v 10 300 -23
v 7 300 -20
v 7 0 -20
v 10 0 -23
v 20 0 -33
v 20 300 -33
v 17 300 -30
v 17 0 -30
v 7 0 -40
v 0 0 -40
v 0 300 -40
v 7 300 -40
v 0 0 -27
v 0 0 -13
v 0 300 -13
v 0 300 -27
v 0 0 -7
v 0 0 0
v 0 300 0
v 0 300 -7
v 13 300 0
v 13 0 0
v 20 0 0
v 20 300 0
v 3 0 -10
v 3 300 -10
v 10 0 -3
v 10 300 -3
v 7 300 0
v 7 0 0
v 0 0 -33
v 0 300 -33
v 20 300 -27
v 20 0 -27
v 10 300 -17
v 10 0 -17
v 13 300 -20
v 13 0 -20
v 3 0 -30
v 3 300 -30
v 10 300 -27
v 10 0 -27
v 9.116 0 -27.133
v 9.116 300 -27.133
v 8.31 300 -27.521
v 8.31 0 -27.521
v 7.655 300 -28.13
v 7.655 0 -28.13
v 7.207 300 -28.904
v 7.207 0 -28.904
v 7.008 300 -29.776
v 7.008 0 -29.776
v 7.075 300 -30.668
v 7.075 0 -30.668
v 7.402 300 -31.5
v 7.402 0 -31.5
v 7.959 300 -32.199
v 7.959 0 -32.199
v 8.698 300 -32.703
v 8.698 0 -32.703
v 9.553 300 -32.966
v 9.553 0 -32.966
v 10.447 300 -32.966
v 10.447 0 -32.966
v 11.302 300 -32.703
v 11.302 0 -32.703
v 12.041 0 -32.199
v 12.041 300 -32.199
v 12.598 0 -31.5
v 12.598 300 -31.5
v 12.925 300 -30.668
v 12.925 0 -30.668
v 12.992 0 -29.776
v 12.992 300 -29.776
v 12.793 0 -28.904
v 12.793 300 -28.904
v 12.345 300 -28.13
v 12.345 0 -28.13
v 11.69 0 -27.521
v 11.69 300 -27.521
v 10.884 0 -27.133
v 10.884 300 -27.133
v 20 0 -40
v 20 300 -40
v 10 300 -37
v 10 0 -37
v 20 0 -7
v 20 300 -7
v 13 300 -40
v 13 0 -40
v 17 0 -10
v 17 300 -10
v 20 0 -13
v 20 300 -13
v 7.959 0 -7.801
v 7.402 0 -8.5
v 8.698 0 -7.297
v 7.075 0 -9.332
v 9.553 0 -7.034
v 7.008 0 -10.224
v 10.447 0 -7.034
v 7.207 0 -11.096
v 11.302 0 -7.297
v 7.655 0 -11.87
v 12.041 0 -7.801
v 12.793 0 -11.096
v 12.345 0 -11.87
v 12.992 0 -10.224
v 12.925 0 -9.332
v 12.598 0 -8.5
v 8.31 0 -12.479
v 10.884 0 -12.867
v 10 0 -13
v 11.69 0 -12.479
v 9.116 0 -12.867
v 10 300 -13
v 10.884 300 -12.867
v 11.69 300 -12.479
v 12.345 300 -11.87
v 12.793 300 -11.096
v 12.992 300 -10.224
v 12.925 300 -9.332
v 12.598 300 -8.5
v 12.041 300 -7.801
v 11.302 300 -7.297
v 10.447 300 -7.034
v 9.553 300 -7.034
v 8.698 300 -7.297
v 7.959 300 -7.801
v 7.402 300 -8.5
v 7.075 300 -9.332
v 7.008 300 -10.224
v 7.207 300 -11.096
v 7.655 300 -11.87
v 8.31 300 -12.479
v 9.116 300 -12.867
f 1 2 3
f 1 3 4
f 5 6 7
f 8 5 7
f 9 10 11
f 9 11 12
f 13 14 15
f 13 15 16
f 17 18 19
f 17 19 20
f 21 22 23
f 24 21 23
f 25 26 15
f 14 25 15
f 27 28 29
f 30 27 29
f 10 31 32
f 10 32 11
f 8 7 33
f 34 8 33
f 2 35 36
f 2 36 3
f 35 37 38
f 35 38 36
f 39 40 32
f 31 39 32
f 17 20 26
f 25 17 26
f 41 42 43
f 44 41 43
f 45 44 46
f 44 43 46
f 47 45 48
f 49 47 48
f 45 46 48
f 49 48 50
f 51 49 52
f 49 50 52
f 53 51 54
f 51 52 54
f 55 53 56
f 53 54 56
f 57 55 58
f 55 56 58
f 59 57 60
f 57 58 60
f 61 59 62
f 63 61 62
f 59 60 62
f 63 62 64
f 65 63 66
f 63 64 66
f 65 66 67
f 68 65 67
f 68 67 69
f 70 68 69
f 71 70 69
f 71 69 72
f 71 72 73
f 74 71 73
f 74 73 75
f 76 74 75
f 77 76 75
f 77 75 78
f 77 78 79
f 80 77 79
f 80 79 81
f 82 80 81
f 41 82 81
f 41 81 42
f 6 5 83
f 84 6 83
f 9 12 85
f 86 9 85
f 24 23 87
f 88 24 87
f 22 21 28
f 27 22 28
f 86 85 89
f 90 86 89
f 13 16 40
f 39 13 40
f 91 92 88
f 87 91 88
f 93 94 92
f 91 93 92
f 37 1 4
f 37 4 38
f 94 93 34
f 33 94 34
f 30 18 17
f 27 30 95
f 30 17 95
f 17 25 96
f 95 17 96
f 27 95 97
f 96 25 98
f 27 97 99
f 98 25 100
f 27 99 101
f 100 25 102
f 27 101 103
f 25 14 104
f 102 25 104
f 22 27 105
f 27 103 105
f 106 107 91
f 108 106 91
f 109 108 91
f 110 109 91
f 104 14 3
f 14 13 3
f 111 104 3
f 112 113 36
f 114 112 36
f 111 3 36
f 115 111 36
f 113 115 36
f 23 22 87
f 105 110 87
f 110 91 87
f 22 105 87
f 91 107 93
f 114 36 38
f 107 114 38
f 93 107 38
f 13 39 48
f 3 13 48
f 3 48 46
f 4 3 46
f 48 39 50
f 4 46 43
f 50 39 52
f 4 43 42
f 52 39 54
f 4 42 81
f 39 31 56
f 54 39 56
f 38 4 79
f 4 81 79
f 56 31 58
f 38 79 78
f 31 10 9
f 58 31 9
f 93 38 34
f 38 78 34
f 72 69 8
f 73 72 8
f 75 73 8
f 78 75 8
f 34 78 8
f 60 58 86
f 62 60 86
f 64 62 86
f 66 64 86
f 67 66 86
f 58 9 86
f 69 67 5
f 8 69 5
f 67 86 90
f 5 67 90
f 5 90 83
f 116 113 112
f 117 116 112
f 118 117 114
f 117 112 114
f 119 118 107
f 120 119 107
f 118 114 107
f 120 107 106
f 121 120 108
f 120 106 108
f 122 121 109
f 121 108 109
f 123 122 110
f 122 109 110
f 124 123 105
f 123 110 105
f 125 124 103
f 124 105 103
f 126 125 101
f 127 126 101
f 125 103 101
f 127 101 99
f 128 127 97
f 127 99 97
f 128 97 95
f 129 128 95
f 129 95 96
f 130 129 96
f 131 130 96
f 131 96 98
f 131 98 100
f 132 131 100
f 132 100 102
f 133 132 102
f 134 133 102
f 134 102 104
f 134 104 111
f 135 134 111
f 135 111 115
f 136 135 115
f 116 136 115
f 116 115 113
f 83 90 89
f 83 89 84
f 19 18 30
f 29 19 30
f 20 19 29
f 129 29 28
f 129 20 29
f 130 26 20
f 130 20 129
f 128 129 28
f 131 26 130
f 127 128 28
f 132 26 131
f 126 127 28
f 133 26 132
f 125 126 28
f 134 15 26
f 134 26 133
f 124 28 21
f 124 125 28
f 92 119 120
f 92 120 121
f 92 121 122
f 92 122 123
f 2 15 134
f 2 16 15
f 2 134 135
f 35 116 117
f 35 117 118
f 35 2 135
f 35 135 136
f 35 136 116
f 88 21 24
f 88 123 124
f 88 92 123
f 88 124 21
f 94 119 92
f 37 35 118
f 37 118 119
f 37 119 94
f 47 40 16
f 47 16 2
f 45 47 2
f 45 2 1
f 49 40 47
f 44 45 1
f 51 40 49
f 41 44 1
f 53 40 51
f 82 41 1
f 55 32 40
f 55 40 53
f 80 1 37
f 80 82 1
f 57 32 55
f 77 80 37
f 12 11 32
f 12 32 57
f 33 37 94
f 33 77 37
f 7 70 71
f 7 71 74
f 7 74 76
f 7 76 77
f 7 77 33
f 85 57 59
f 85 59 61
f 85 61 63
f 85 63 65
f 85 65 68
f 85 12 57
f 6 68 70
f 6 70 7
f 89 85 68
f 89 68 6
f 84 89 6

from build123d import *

# Parameters (mm, degrees)
SKIZZE1_W                       = 20
SKIZZE1_H                       = 40
AUFSATZ_LINEAR_AUSTRAGEN1_DEPTH = 300
SCHNITT_LINEAR_AUSTRAGEN1_DEPTH = 304.315017762
SKIZZE3_R                       = 3
SCHNITT_LINEAR_AUSTRAGEN2_DEPTH = 304.315017762


with BuildPart() as part:
    # Skizze1 → Aufsatz-Linear austragen1 (new body)
    with BuildSketch(Plane(origin=(0, 0, 0), x_dir=(1, 0, 0), z_dir=(0, 1, 0))):
        with Locations((10, 20)):
            Rectangle(SKIZZE1_W, SKIZZE1_H)
    extrude(amount=AUFSATZ_LINEAR_AUSTRAGEN1_DEPTH)

    # Skizze2 → Schnitt-Linear austragen1 (cut, through all)
    with BuildSketch(Plane(origin=(0, 300, 0), x_dir=(1, 0, 0), z_dir=(0, 1, 0))):
        Polygon((3, 30), (0, 33), (0, 27), align=None)
        Polygon((13, 40), (7, 40), (10, 37), align=None)
        Polygon((20, 27), (20, 33), (17, 30), align=None)
        Polygon((13, 20), (10, 17), (7, 20), align=None)
        Polygon((7, 20), (10, 23), (13, 20), align=None)
        Polygon((20, 7), (20, 13), (17, 10), align=None)
        Polygon((3, 10), (0, 13), (0, 7), align=None)
        Polygon((10, 3), (7, 0), (13, 0), align=None)
    extrude(amount=-SCHNITT_LINEAR_AUSTRAGEN1_DEPTH, mode=Mode.SUBTRACT)

    # Skizze3 → Schnitt-Linear austragen2 (cut, through all)
    with BuildSketch(Plane.XZ):
        with Locations(Location((10, -10, 0), (0, 0, 270))):
            Circle(SKIZZE3_R)
        with Locations(Location((10, -30, 0), (0, 0, 90))):
            Circle(SKIZZE3_R)
    extrude(amount=-SCHNITT_LINEAR_AUSTRAGEN2_DEPTH, mode=Mode.SUBTRACT)


solid = part.part
